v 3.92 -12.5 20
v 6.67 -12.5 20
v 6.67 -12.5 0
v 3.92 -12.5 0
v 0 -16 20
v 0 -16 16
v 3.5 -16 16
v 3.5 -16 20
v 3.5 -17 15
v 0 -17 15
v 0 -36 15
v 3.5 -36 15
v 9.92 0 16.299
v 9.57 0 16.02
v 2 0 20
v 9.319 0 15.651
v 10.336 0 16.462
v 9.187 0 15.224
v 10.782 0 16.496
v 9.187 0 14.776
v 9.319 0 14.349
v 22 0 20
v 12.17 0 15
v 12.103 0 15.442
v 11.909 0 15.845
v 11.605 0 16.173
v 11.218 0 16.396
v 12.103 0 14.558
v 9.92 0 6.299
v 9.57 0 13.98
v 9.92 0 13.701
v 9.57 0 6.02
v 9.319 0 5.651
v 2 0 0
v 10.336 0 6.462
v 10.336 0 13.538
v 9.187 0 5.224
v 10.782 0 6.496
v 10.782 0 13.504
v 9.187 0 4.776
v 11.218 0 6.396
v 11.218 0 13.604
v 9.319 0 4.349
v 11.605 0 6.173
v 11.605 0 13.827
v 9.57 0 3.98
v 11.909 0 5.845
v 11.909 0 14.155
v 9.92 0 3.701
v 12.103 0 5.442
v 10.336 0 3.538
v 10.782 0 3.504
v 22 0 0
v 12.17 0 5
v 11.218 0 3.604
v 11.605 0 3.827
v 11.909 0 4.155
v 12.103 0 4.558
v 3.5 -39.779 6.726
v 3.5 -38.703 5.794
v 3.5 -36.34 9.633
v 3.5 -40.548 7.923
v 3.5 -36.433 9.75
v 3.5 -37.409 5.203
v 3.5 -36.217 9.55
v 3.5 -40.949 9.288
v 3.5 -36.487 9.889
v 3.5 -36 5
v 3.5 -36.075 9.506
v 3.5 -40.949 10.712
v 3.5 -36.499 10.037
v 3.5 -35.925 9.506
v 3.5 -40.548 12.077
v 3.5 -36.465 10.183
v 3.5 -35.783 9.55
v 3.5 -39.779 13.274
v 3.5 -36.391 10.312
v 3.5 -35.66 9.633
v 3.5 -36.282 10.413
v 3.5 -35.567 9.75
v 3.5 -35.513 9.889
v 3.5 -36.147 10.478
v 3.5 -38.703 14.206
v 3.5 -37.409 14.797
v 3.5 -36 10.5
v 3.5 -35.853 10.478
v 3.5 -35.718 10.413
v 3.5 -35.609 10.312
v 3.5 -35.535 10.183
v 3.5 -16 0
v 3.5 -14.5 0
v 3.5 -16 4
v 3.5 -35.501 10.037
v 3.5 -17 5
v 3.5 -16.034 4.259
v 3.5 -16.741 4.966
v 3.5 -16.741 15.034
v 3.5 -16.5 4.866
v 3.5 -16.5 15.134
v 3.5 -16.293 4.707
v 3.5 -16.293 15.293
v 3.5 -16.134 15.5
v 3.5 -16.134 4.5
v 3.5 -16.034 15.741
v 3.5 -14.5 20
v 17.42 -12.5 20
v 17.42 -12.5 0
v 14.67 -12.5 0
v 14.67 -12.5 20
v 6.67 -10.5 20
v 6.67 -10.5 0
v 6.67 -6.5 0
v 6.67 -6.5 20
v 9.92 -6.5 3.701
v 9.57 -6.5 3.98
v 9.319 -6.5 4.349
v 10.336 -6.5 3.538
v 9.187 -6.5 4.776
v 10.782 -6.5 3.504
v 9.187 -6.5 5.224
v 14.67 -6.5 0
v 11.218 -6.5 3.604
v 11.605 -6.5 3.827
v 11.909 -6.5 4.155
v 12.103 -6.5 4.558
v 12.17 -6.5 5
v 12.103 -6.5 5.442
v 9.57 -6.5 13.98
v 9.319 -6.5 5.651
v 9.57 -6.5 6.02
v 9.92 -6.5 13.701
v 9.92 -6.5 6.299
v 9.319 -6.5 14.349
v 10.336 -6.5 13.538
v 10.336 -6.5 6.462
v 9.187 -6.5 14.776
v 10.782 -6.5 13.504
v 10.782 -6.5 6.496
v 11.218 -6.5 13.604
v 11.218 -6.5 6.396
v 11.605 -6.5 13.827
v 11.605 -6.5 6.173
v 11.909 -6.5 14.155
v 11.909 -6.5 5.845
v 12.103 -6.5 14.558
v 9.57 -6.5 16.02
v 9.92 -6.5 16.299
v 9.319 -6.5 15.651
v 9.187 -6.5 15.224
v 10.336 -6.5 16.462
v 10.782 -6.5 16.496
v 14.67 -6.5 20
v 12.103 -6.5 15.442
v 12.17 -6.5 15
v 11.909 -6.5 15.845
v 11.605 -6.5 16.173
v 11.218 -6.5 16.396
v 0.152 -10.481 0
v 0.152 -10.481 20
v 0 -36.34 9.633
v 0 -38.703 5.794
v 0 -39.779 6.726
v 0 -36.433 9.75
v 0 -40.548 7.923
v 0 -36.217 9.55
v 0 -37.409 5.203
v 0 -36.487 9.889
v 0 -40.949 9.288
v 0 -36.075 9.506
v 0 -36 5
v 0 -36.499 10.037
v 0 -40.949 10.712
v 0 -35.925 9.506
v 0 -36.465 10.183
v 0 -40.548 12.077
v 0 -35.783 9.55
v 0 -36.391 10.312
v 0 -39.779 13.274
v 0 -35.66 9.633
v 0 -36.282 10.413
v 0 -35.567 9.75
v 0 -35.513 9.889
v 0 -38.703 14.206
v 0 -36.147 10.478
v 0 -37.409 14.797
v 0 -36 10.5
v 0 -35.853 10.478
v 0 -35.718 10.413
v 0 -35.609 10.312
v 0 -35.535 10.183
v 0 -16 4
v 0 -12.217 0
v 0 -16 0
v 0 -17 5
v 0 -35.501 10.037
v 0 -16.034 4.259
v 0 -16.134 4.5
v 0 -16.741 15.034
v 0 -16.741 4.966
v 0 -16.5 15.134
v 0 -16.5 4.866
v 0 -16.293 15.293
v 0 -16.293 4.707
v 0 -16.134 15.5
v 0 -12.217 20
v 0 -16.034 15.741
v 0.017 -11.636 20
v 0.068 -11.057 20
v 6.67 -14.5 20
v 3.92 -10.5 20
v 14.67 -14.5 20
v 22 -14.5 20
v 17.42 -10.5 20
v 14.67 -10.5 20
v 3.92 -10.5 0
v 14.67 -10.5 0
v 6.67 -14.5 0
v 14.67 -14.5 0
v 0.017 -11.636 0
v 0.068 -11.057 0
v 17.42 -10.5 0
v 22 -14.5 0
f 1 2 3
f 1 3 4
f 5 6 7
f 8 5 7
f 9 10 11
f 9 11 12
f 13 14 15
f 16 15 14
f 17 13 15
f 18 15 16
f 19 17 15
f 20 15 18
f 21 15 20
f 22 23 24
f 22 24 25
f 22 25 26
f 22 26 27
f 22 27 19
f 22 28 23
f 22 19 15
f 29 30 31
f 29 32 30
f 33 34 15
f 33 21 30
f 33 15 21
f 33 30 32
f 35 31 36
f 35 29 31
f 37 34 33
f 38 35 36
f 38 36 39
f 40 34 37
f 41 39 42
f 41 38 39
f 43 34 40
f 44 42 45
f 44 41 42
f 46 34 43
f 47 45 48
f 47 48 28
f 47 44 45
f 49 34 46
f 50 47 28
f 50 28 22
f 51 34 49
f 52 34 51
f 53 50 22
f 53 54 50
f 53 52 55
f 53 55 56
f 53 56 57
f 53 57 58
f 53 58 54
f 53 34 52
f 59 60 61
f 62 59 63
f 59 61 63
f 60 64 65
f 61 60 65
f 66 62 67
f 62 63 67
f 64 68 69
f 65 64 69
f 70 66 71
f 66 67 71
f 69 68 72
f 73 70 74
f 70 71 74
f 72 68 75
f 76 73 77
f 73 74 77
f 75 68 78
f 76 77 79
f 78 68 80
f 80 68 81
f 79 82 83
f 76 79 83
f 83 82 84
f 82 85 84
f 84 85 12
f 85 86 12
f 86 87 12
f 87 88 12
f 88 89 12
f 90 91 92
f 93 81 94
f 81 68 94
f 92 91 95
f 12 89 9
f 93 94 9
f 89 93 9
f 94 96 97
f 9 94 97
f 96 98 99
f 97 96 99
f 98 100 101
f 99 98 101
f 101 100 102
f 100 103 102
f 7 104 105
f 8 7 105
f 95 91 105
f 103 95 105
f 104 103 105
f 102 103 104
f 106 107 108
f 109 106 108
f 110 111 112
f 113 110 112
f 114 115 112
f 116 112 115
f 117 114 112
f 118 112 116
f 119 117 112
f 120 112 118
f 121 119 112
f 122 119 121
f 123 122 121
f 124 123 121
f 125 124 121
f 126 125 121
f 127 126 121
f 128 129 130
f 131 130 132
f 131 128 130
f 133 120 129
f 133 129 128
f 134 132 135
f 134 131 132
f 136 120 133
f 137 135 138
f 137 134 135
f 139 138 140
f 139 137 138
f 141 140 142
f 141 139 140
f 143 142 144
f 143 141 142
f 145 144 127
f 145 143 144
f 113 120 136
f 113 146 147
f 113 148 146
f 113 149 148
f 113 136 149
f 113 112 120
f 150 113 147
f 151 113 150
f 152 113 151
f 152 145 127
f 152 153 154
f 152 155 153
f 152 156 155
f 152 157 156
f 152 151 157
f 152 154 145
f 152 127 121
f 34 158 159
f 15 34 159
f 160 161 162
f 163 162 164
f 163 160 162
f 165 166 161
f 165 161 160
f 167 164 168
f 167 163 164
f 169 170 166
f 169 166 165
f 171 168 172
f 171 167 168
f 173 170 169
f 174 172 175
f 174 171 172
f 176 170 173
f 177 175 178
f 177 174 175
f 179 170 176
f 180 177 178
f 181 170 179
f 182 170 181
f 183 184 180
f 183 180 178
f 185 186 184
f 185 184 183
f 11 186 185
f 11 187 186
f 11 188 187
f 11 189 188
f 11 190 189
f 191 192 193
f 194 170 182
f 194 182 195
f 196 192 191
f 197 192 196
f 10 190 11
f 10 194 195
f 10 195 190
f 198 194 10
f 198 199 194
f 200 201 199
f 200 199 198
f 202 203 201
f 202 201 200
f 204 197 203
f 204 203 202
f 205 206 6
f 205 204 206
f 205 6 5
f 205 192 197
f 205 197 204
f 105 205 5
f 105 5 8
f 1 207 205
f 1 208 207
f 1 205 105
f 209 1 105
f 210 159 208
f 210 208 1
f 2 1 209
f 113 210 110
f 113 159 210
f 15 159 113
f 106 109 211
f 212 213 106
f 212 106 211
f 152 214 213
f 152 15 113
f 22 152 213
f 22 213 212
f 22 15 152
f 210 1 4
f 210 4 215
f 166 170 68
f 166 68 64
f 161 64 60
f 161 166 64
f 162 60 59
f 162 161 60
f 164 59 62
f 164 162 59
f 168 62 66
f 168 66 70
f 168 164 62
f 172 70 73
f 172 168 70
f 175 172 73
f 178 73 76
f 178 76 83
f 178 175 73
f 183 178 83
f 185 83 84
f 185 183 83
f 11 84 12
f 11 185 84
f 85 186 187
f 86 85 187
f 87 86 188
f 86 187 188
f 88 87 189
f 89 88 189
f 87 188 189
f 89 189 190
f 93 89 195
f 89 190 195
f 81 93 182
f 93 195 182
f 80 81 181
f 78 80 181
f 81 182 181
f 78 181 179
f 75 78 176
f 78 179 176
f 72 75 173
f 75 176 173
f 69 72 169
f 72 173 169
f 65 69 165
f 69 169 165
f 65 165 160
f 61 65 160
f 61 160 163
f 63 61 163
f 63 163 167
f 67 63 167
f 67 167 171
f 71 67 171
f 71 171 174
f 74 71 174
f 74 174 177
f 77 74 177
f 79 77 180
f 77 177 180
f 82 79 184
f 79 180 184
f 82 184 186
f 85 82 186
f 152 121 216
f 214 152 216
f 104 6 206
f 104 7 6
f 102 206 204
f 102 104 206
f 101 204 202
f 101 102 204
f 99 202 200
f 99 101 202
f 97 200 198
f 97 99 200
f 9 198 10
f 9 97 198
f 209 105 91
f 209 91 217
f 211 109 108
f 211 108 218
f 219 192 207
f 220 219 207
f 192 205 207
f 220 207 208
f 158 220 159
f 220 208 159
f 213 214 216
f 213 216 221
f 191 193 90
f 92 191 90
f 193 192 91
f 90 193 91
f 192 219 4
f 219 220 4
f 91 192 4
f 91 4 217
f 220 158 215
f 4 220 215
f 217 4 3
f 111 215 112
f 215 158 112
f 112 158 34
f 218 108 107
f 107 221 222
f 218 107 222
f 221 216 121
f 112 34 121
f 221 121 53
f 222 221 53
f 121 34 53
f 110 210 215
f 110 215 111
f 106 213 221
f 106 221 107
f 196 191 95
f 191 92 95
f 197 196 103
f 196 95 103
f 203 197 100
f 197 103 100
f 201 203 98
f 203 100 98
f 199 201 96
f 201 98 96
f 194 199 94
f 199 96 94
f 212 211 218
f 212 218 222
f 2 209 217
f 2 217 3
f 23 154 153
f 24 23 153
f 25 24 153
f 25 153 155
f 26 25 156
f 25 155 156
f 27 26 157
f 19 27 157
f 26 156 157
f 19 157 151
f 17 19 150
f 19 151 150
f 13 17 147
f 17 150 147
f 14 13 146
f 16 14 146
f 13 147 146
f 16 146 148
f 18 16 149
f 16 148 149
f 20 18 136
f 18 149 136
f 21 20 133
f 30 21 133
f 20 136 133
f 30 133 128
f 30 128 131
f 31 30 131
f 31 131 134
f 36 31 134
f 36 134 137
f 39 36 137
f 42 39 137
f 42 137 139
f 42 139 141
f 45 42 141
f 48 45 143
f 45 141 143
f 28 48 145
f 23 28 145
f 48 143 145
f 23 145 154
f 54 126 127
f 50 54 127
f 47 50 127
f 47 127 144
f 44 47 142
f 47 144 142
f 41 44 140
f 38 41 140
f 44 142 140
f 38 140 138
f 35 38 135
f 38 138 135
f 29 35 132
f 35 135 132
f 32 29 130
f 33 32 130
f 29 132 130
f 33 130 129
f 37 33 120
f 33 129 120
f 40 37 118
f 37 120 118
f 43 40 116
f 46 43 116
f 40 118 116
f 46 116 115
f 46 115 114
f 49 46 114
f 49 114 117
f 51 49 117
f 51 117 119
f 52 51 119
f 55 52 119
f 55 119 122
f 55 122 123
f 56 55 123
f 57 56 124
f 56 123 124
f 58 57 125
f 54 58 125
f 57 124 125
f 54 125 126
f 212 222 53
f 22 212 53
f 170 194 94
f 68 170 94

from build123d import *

# Parameters (mm, degrees)
SKETCH1_W           = 22
SKETCH1_H           = 16
BOSS_EXTRUDE1_DEPTH = 20
CHAMFER1_SIZE       = 2
CHAMFER1_SIZE2      = 11.342563639
CUT_EXTRUDE1_DEPTH  = 20
FILLET1_R           = 10
SKETCH3_W           = 3.5
SKETCH3_H           = 10
BOSS_EXTRUDE2_DEPTH = 20
FILLET2_R           = 1
BOSS_EXTRUDE3_DEPTH = 3.5
SKETCH8_R           = 0.5
CUT_EXTRUDE2_DEPTH  = 3.5
SKETCH9_R           = 1.5
CUT_EXTRUDE3_DEPTH  = 6.5


with BuildPart() as part:
    # Sketch1 → Boss-Extrude1 (new body)
    with BuildSketch(Plane.XY):
        with Locations((11, -8)):
            Rectangle(SKETCH1_W, SKETCH1_H)
    extrude(amount=BOSS_EXTRUDE1_DEPTH)

    # Chamfer1
    chamfer1_edges = [part.edges().sort_by_distance(p)[0] for p in [
        (0, 0, 10),
    ]]
    chamfer1_side = [part.faces().sort_by_distance(p)[0] for p in [
        (11, 0, 10),
    ]]
    chamfer(chamfer1_edges, length=CHAMFER1_SIZE, length2=CHAMFER1_SIZE2, reference=chamfer1_side[0])

    # Sketch2 → Cut-Extrude1 (cut)
    with BuildSketch(Plane.XY.offset(20)):
        Polygon((3.5, -16), (3.5, -14.5), (6.67, -14.5), (6.67, -12.5), (3.92, -12.5), (3.92, -10.5), (6.67, -10.5), (6.67, -6.5), (14.67, -6.5), (14.67, -10.5), (17.42, -10.5), (17.42, -12.5), (14.67, -12.5), (14.67, -14.5), (22, -14.5), (22, -16), align=None)
    extrude(amount=-CUT_EXTRUDE1_DEPTH, mode=Mode.SUBTRACT)

    # Fillet1
    fillet1_edges = [part.edges().sort_by_distance(p)[0] for p in [
        (0, -11.342563639, 10),
    ]]
    fillet(fillet1_edges, radius=FILLET1_R)

    # Sketch3 → Boss-Extrude2 (add)
    with BuildSketch(Plane.XZ.offset(16)):
        with Locations((1.75, 10)):
            Rectangle(SKETCH3_W, SKETCH3_H)
    extrude(amount=BOSS_EXTRUDE2_DEPTH)

    # Fillet2
    fillet2_edges = [part.edges().sort_by_distance(p)[0] for p in [
        (1.75, -16, 5),
        (1.75, -16, 15),
    ]]
    fillet(fillet2_edges, radius=FILLET2_R)

    # Sketch7 → Boss-Extrude3 (add)
    with BuildSketch(Plane.ZY):
        with BuildLine():
            Line((15, -36), (5, -36))
            ThreePointArc((5, -36), (10, -41), (15, -36))
        make_face()
    extrude(amount=-BOSS_EXTRUDE3_DEPTH)

    # Sketch8 → Cut-Extrude2 (cut)
    with BuildSketch(Plane.ZY):
        with Locations((10, -36)):
            Circle(SKETCH8_R)
    extrude(amount=-CUT_EXTRUDE2_DEPTH, mode=Mode.SUBTRACT)

    # Sketch9 → Cut-Extrude3 (cut)
    with BuildSketch(Plane.XZ.offset(6.5)):
        with Locations((10.67, 15)):
            Circle(SKETCH9_R)
        with Locations((10.67, 5)):
            Circle(SKETCH9_R)
    extrude(amount=-CUT_EXTRUDE3_DEPTH, mode=Mode.SUBTRACT)


solid = part.part
